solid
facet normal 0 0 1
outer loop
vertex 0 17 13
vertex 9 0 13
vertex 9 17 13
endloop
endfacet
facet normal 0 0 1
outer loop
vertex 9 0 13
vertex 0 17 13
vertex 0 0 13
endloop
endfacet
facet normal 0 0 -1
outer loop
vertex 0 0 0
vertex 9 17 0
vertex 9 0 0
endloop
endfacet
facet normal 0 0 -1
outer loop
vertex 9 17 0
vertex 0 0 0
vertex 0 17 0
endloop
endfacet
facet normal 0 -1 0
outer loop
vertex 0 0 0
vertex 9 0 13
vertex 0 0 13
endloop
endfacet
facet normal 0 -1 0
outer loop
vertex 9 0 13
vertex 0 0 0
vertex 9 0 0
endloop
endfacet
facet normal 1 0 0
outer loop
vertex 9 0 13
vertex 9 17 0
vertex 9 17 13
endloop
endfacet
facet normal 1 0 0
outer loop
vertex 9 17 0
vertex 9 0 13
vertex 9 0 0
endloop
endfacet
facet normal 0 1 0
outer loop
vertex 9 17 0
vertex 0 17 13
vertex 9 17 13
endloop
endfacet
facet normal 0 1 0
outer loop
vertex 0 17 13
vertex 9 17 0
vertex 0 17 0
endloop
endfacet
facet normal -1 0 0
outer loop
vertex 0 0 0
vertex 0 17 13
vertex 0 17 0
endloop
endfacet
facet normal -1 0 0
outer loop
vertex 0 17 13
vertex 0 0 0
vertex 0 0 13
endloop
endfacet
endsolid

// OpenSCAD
// Generated by SolidPython 1.0.1 on 2020-07-29 00:46:55


cube(size = [9, 17, 13]);
/***********************************************
*********      SolidPython code:      **********
************************************************
 
# import packages: SolidPython
from solid import *
from solid.utils import *
from itertools import chain, combinations, permutations


class Resize:

    def __init__(self, scad_file):
        self.scad_file = scad_file
        #self.scad_file = import_scad(scad_file)
        # cone/cylinder param:
        self.r1 = 0
        self.r2 = 0
        self.h = 0
        # rectangular prism param:
        self.w = 0
        self.l = 0
        # ellipse param:
        self.r = 0

    # import OpenScad code (file name corresponds to shape)


    # classify shape + parameters
    def assign(self, param1, param2, param3):
        if self.scad_file == 'cone.scad':
            self.r1 = param1
            self.r2 = param2
            self.h = param3
        elif self.scad_file == 'cylinder.scad':
            self.r1 = param1
            self.r2 = param2
            self.h = param3
        elif self.scad_file == 'rectangularPrism.scad':
            self.h = param1
            self.l = param2
            self.w = param3
        else:
            self.r = param1
            self.h = param2

    # resize parameters
    def iterate(self):
        x = range(3, 20, 2)
        i = 1
        if self.scad_file == 'cone.scad':
            tempList = list(permutations(x, 2))
            for temp in tempList:
                param1 = temp[0]
                param2 = temp[1]
                filepath = 'produced_scad_files/' + 'cone' + str(param1) + '_' + str(param2) + '_' + '.scad'
                scad_render_to_file(cylinder(h=param1, r1=param2, r2=0), filepath)

        elif self.scad_file == 'cylinder.scad':
            tempList = list(permutations(x, 3))
            for temp in tempList:
                param1 = temp[0]
                param2 = temp[1]
                filepath = 'produced_scad_files/' + 'cylinder' + str(param1) + '_' + str(param2) + '_' + '.scad'
                scad_render_to_file(cylinder(h=param1, r1=param2, r2=param2), filepath)

        elif self.scad_file == 'rectangularPrism.scad':
            tempList = list(permutations(x, 3))
            for temp in tempList:
                param1 = temp[0]
                param2 = temp[1]
                param3 = temp[2]
                filepath = 'produced_scad_files/' + 'rectangularPrism' + str(param1) + '_' + str(param2) + '_' + str(
                    param3) + '.scad'
                scad_render_to_file(cube(size=(param1, param2, param3)), filepath)

        elif self.scad_file == 'ellipse.scad':
            tempList = list(permutations(x, 4))
            for temp in tempList:
                param1 = temp[0]
                param2 = temp[1]
                param3 = temp[2]
                param4 = temp[3]
                filepath = 'produced_scad_files/' + 'ellipse' + str(param1) + '_' + str(param2) + '_' + str(param3) + '_' + str(param4) + '.scad'
                scad_render_to_file(scale([param1, param2, param3])(sphere(r=param4)), filepath)

    def render_to_scadfile(self):
        scad_render_to_file(scad, 'example.scad') 
 
************************************************/
